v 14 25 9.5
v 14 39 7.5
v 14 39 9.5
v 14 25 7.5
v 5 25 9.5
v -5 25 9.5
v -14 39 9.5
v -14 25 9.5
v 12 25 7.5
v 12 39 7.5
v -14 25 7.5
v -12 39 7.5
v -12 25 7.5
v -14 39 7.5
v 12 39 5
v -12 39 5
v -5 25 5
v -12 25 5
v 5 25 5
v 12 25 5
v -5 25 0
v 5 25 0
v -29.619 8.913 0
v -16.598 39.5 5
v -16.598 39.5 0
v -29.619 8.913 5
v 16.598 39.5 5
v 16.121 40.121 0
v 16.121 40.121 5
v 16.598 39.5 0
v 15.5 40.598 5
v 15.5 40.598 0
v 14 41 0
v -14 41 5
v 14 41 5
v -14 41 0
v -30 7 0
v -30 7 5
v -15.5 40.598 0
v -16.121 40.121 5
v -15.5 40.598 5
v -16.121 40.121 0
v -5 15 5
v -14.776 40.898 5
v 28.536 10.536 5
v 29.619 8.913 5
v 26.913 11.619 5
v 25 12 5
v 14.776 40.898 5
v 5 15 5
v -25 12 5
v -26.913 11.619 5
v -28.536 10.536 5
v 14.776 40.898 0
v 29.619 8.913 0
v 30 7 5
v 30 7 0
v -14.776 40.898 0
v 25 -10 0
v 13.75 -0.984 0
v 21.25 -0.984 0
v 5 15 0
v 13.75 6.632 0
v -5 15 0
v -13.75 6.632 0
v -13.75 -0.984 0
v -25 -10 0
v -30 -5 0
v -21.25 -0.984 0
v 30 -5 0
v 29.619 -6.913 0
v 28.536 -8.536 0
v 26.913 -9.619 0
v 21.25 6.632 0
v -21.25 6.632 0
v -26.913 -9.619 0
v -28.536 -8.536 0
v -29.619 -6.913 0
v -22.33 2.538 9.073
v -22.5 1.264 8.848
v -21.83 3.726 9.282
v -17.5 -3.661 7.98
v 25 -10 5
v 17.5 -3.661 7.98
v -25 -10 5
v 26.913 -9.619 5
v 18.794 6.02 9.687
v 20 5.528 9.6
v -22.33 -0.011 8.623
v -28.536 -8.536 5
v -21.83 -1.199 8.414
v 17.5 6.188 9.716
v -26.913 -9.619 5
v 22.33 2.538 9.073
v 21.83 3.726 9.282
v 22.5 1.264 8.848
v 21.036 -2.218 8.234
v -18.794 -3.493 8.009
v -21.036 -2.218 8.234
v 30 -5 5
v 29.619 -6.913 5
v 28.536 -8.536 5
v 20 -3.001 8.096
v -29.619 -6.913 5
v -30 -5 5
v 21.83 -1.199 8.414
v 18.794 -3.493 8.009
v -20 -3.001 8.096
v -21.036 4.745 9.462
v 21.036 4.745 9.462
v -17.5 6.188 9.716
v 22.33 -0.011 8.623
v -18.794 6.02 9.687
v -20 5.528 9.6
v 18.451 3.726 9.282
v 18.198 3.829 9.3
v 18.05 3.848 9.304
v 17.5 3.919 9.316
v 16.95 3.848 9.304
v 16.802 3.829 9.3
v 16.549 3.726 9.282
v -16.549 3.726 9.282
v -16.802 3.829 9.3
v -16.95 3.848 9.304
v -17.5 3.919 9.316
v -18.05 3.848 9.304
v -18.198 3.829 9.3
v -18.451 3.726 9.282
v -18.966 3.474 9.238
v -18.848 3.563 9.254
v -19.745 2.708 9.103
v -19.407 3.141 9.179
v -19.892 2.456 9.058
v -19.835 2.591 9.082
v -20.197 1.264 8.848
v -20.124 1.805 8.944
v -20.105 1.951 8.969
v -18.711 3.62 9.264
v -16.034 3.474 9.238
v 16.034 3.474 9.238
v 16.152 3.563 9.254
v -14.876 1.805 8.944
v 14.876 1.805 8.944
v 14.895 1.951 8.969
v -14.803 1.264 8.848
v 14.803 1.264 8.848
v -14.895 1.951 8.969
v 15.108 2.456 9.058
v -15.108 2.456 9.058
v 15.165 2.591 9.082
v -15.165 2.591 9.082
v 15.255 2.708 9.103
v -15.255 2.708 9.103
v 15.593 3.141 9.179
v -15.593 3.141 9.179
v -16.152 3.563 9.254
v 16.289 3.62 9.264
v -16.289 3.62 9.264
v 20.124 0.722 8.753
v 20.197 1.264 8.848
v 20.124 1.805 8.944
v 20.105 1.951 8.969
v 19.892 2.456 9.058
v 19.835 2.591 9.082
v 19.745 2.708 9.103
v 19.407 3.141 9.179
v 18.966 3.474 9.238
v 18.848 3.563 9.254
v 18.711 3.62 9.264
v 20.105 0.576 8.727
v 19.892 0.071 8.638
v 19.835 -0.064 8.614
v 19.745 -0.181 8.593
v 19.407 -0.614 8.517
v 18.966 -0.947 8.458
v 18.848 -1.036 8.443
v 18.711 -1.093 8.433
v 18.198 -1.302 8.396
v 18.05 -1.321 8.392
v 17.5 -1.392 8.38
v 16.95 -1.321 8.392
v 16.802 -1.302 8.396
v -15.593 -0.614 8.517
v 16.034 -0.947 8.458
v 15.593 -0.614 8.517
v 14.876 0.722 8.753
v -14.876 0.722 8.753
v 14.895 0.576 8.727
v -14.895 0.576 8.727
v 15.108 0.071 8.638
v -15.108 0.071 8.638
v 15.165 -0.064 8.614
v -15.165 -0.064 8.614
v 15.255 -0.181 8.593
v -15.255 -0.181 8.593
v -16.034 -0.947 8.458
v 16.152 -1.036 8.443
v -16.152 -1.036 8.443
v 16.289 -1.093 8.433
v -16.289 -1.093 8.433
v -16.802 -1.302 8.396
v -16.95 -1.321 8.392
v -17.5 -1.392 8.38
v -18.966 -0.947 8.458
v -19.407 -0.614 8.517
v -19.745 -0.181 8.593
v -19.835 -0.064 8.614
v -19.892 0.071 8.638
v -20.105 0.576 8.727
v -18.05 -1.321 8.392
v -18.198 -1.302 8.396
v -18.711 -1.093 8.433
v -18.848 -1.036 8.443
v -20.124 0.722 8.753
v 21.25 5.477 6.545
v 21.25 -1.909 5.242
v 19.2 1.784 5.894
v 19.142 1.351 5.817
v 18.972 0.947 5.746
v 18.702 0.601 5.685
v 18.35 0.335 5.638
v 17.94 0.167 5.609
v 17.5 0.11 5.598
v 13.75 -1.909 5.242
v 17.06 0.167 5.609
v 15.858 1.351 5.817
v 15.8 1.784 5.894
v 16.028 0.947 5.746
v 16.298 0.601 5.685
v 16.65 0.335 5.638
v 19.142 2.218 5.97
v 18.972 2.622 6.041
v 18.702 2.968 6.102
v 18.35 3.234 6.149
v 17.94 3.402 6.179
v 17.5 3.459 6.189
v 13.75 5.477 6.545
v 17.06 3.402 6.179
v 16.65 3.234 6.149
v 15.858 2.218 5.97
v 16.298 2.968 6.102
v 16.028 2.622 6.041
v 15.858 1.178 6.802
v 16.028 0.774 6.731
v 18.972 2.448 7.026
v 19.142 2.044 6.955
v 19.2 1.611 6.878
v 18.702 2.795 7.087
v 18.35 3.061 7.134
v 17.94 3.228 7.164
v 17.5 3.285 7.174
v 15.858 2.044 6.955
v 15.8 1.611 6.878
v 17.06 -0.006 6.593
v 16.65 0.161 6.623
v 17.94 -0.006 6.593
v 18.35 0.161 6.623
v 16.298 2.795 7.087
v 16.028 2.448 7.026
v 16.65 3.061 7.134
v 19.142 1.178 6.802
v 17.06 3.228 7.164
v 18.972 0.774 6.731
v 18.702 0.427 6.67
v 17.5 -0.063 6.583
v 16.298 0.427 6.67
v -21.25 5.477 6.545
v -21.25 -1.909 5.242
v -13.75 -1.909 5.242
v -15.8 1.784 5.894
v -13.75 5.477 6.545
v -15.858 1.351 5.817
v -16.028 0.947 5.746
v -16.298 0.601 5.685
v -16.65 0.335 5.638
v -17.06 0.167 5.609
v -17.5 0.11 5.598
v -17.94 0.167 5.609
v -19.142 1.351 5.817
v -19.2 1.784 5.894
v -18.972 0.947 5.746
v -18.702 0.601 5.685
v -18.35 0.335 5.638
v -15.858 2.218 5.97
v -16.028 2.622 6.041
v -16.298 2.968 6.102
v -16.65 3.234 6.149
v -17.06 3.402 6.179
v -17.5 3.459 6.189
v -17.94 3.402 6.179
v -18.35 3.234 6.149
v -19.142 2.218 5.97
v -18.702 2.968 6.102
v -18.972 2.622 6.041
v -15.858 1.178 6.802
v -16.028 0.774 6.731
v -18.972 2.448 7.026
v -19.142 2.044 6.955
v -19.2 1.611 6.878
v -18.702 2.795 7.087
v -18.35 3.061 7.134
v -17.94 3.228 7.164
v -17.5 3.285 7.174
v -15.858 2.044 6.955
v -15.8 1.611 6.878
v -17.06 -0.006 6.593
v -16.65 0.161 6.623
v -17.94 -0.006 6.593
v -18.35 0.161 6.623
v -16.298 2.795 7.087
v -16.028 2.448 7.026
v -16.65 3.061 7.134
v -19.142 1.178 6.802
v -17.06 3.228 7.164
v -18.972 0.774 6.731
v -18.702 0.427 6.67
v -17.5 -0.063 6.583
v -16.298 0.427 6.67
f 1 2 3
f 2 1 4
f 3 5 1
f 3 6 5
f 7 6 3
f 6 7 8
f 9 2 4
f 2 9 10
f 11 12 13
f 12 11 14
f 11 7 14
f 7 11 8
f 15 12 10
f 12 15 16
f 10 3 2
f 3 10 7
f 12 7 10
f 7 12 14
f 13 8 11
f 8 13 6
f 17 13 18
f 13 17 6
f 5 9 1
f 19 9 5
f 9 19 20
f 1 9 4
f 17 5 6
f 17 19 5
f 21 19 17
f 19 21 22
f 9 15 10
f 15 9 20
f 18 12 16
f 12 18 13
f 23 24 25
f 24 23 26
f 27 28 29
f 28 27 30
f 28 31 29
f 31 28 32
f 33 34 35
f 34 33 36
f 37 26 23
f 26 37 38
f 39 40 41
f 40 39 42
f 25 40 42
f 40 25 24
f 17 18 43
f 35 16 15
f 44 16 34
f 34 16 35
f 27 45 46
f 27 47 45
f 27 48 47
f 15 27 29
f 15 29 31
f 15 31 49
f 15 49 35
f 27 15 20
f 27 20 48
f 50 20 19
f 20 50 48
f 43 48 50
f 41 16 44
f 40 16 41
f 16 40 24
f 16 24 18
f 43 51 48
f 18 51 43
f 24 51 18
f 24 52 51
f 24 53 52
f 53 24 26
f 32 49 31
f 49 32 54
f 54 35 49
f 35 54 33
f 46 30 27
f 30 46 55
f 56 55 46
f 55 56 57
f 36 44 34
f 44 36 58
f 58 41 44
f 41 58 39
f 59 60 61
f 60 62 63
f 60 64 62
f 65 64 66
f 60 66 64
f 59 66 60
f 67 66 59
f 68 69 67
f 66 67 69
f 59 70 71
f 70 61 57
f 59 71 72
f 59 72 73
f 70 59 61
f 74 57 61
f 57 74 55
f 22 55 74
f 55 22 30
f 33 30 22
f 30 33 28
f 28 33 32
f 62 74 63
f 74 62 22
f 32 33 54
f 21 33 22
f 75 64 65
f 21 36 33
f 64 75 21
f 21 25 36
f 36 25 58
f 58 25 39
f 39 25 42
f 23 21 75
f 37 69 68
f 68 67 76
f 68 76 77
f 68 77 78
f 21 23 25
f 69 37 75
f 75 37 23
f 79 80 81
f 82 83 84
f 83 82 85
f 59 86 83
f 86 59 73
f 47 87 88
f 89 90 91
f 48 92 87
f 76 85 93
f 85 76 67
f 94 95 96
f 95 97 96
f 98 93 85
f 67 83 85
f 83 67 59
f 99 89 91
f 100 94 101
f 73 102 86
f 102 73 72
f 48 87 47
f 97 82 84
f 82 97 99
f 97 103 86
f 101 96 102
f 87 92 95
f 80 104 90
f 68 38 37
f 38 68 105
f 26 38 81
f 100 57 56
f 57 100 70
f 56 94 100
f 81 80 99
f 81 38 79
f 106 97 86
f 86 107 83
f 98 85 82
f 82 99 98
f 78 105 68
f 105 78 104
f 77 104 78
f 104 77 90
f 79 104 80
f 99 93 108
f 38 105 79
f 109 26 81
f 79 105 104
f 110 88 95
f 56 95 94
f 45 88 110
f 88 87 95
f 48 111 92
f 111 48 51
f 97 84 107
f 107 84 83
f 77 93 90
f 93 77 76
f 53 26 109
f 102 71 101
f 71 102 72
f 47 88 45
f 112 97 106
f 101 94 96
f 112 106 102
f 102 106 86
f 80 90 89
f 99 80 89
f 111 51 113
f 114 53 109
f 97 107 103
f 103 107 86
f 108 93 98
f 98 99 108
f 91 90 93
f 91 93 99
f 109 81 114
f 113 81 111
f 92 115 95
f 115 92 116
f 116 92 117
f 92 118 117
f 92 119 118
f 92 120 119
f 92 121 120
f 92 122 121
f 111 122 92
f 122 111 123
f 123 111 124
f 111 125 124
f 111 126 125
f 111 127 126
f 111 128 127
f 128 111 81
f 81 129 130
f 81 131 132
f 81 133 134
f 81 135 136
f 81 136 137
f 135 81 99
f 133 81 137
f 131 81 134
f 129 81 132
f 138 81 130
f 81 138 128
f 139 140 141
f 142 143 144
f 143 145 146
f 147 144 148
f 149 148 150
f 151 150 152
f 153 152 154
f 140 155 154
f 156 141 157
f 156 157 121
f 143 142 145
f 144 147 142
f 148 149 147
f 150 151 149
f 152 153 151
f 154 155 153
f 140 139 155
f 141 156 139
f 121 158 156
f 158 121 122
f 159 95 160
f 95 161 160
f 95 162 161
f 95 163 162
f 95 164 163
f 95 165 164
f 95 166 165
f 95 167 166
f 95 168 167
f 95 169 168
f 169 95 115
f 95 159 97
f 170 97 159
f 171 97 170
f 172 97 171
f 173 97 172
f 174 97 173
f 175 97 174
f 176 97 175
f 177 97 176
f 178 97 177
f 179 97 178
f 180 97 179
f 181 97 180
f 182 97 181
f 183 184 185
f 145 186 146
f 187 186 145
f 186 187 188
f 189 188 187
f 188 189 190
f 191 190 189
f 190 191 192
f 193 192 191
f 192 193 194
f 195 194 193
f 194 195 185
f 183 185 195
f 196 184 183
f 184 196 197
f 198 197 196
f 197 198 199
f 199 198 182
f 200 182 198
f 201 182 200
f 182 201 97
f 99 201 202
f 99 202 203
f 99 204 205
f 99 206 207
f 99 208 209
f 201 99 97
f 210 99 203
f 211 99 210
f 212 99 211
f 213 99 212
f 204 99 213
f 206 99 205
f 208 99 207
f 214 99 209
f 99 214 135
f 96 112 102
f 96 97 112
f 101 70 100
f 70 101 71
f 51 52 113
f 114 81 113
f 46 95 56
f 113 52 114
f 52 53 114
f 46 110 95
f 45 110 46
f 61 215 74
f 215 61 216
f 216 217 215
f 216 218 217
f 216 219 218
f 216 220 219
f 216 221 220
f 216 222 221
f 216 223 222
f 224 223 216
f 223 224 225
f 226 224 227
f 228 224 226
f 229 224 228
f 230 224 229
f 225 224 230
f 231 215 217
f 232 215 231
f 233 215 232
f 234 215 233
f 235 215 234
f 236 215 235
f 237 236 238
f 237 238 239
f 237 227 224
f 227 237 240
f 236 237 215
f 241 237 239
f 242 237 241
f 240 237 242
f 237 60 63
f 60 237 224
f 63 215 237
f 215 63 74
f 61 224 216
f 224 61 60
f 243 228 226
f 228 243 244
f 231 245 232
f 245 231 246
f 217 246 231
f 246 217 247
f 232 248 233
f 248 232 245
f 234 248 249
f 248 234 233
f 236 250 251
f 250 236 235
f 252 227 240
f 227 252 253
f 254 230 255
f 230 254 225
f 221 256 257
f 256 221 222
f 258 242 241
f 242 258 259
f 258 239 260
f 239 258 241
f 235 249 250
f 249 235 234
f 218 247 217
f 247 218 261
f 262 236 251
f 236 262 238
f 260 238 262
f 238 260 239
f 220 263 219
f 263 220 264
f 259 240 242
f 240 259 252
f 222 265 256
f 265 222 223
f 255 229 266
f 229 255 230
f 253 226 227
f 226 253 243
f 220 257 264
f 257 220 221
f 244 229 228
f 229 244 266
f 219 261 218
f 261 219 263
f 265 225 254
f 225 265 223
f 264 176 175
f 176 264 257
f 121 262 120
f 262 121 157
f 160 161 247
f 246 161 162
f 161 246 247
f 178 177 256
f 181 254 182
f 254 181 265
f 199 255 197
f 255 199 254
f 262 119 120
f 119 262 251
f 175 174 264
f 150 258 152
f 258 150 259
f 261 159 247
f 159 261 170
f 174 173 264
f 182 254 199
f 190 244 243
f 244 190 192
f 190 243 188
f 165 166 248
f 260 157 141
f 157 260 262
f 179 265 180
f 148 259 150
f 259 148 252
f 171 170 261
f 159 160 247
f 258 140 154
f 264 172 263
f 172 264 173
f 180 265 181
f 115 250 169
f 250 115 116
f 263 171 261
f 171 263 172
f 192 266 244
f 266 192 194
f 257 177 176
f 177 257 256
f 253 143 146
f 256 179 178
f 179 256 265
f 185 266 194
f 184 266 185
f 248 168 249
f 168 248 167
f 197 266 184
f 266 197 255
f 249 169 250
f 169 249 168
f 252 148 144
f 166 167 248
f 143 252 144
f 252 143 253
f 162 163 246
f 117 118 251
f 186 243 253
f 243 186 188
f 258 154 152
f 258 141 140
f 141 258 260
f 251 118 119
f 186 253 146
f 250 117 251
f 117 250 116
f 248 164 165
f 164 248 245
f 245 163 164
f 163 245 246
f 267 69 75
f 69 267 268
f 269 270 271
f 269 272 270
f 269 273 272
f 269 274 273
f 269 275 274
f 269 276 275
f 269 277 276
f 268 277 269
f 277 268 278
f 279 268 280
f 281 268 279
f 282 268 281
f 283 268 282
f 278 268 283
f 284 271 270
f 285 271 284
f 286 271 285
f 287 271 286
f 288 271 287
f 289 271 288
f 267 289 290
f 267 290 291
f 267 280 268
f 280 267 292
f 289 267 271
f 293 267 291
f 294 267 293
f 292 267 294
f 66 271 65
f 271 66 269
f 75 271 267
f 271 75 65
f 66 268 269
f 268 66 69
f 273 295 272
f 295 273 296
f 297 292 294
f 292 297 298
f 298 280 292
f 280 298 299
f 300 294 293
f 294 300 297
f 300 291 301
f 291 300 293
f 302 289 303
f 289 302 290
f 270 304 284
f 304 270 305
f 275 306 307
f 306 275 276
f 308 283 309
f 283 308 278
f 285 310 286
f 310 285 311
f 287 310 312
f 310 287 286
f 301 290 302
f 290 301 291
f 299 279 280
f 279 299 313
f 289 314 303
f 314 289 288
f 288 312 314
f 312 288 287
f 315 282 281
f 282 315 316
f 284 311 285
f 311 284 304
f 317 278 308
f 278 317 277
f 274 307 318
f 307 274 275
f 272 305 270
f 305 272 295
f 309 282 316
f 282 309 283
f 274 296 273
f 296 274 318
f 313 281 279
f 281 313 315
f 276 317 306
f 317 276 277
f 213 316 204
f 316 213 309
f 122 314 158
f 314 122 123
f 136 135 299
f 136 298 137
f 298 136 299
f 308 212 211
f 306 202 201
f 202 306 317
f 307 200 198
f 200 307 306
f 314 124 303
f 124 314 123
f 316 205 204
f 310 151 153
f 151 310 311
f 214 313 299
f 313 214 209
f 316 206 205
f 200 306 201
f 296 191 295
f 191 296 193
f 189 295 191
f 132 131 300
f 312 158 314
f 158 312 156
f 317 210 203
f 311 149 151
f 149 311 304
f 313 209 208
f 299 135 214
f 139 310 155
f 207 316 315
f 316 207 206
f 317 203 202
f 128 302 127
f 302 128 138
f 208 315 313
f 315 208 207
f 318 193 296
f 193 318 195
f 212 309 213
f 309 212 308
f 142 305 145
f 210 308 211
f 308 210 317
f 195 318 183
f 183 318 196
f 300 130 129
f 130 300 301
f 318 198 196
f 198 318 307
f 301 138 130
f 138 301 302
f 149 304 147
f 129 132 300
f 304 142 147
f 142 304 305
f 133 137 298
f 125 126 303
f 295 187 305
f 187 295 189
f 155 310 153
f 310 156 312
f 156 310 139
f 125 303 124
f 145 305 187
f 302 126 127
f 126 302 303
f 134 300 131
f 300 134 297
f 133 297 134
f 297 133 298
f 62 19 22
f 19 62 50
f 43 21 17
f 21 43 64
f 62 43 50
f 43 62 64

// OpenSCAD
FFF=[false,false,false];FFT=[false,false,true];
FTF=[false,true,false];FTT=[false,true,true];
TFF=[true,false,false];TFT=[true,false,true];
TTF=[true,true,false];TTT=[true,true,true];
module cube2(size, center) {
  translate([
    center[0] ? -size[0]/2 : 0,
    center[1] ? -size[1]/2 : 0,
    center[2] ? -size[2]/2 : 0]) cube(size);
}
module mirror_x() {
  for(a=[0,1])mirror([a,0,0])children();
}
module mirror_y() {
  for(a=[0,1])mirror([0,a,0])children();
}
module mirror_z() {
  for(a=[0,1])mirror([0,0,a])children();
}

module hook() {
  difference() {
    union() {
      hull()for(a=[-5,5])translate([a,0])cylinder(d=5,h=3,$fn=72);
      cylinder(d=5,h=22,$fn=72);
      hull() {
        translate([0,0,19])cylinder(d=5,h=3,$fn=72);
        translate([0,0,22])cube2([7,7,5],TTF);
      }
    }
    translate([0,0,10])cylinder(d=2.7,h=200,$fn=12);
  }
}

module base() {
  hook_offset=25;
  difference() {
    union() {
      hull()mirror_x() {
        translate([14,hook_offset+13])cylinder(r=3,h=5,$fn=24);
        translate([25,7])cylinder(r=5,h=5);
      }
      hull()mirror_x() {
        translate([25,7])cylinder(r=5,h=5);
        translate([25,-5])cylinder(r=5,h=5);
        translate([35/2,3,-1]) rotate([10,0,0]) {
          translate([0,0,depth])cylinder(d=10,h=3,$fn=24);
        }
      }
      translate([0,hook_offset,4.5]) {
        translate([0,0,3])cube2([28,14,2],TFF);
        cube2([24,14,4],TFF);
      }
    }
    translate([0,hook_offset-10,0]) cube2([10,10,100],TFT);
    depth=7;
    mirror_x() translate([35/2,3,-1]) rotate([10,0,0]) {
      cube2([7.5,7.5,depth],TTF);
      cylinder(d=3.4,h=100,$fn=24);
      translate([0,0,depth+1])cylinder(d1=3.4,d2=6.4,h=3.01,$fn=24);
      translate([0,0,depth+4])cylinder(d=6.4,h=10,$fn=24);
    }
  }
}
base();
//hook();
